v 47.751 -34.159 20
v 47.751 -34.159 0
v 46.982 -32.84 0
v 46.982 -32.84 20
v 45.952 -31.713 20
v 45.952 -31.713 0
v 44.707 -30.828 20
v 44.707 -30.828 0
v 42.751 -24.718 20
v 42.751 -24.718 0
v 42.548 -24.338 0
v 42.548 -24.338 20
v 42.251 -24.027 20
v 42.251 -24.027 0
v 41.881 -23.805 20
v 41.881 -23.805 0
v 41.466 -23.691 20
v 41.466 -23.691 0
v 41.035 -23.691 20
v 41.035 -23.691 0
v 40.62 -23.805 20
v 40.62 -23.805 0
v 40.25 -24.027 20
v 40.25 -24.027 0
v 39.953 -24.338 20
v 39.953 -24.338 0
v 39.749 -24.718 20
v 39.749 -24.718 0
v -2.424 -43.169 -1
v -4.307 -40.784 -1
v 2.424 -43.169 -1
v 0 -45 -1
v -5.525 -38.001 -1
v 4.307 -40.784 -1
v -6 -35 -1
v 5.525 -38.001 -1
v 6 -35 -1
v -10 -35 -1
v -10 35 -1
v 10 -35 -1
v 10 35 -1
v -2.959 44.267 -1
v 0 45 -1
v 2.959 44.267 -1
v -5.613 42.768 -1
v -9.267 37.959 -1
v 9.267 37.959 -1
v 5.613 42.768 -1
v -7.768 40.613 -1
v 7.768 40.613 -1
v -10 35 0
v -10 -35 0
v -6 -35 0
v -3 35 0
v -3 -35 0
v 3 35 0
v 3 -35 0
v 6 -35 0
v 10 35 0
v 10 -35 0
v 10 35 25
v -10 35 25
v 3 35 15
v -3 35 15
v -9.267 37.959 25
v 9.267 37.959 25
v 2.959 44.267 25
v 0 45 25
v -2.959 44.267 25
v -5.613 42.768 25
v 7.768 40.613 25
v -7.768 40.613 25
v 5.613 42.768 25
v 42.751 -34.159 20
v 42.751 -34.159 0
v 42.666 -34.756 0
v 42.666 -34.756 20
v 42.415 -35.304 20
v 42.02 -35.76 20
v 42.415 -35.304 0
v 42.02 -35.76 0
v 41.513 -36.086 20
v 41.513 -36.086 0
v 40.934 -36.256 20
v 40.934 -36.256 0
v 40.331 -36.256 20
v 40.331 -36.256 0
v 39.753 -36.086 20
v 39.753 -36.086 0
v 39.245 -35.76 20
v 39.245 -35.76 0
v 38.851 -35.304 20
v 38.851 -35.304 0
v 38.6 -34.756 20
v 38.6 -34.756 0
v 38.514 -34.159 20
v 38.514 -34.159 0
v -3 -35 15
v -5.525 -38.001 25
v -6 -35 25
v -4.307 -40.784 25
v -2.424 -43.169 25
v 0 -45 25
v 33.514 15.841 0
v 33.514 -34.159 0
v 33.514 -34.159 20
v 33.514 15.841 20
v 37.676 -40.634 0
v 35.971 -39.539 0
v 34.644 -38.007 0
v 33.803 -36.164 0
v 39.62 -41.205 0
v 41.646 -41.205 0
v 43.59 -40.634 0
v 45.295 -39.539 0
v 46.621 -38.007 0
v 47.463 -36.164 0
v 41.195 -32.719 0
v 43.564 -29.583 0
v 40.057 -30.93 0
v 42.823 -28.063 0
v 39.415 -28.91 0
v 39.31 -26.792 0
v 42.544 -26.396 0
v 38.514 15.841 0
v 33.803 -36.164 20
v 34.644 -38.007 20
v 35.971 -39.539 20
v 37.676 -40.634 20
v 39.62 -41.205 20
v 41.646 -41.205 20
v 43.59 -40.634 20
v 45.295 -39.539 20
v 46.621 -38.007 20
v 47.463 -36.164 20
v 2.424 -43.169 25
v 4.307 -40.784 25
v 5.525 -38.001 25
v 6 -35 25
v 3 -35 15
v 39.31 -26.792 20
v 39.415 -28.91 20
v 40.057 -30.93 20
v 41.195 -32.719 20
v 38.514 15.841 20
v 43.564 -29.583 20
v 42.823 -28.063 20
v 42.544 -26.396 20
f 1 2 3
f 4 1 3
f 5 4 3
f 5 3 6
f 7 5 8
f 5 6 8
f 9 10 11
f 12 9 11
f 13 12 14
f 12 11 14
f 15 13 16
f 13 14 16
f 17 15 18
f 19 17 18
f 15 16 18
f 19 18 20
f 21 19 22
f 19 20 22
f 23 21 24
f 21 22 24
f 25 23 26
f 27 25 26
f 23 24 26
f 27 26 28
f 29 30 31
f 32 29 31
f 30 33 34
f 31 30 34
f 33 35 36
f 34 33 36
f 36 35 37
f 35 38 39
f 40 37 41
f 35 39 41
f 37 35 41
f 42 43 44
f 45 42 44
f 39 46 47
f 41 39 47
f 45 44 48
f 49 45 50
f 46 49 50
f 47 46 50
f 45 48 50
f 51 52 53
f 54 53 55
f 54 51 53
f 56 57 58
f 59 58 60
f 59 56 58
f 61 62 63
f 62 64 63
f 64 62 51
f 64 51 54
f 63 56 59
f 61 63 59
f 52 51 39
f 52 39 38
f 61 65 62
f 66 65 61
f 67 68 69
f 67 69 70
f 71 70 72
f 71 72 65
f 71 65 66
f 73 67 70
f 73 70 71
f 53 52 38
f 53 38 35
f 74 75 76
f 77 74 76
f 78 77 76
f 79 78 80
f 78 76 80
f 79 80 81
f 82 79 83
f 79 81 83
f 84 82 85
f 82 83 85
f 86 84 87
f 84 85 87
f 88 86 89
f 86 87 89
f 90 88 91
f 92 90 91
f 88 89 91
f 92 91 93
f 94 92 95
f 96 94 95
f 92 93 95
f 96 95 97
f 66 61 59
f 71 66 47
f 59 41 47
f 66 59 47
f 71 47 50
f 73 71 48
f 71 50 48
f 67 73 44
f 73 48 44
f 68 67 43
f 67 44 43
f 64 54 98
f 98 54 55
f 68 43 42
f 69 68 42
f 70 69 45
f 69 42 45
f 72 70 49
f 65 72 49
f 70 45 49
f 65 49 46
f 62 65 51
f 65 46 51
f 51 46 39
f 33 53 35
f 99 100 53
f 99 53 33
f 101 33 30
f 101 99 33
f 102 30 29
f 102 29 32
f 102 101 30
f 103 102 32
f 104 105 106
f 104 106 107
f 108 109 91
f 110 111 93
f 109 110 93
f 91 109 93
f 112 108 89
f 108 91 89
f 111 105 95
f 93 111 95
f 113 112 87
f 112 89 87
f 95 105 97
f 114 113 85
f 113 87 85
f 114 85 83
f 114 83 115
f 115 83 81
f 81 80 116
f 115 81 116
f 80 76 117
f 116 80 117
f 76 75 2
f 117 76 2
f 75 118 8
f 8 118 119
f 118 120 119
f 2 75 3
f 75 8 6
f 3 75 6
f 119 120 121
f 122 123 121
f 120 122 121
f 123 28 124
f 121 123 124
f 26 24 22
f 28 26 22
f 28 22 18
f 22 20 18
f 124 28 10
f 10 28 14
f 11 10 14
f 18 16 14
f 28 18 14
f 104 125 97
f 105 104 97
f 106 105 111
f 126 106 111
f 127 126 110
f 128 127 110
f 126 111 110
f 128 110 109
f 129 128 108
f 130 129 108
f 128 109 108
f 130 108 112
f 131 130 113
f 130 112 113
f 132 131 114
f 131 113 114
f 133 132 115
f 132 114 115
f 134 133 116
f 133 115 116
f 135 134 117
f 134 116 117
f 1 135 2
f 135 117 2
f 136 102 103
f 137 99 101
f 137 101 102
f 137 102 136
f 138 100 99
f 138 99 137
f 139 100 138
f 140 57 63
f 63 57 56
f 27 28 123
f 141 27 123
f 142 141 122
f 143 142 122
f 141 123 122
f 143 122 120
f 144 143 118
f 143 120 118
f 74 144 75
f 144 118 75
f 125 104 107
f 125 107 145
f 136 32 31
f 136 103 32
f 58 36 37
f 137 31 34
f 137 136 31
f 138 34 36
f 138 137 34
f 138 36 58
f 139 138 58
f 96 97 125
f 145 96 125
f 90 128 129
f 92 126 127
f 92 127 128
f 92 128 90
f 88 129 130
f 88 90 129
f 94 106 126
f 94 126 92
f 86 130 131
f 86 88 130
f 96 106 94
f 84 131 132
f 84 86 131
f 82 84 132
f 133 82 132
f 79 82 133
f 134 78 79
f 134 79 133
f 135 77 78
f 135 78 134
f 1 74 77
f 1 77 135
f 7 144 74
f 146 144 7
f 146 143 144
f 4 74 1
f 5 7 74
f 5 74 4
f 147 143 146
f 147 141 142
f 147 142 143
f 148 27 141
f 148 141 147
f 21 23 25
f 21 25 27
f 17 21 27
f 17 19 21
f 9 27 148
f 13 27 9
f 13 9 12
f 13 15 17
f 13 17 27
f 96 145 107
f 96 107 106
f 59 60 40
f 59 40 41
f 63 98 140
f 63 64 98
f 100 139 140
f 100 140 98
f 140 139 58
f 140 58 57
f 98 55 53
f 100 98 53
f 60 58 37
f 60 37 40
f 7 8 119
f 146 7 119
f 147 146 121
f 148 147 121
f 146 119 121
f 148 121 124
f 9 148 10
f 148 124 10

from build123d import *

# Parameters (mm, degrees)
F0_W     = 3
F0_H     = 29.6977118962
F0_H_2   = 40.3022881038
F1_DEPTH = 1
F2_DEPTH = 15
F3_DEPTH = 25
F4_W     = 5
F4_H     = 50
F5_DEPTH = 20


# Not quite as in the source:
# - ends of sketch curves that miss each other by under 0.0002 mm in the source are joined


with BuildPart() as f1:
    # F0 (on Top) → F1 (new body)
    with BuildSketch(Plane.XY):
        with BuildLine():
            Line((-3, 35), (0, 35))
            Line((0, 35), (0, 45))
            ThreePointArc((0, 45), (-6.7636906533, 41.7636906533), (-10, 35))
            Line((-10, 35), (-3, 35))
        make_face()
        with BuildLine():
            Line((0, 45), (0, 35))
            Line((0, 35), (3, 35))
            Line((3, 35), (10, 35))
            ThreePointArc((10, 35), (6.7636906533, 41.7636906533), (0, 45))
        make_face()
        with Locations((-1.5, 20.1511440519)):
            Rectangle(F0_W, F0_H)
        with Locations((-1.5, -14.8488559481)):
            Rectangle(F0_W, F0_H_2)
        with BuildLine():
            Line((3, -35), (0, -35))
            Line((0, -35), (0, -45))
            ThreePointArc((0, -45), (4.3065233729, -40.7839140238), (6, -35))
            Line((6, -35), (3, -35))
        make_face()
        Polygon((10, 35), (3, 35), (3, -35), (6, -35), (10, -35), align=None)
        Polygon((3, 35), (0, 35), (0, 5.3022881038), (0, -35), (3, -35), align=None)
        Polygon((-3, 5.3022881038), (-3, 35), (-10, 35), (-10, -35), (-6, -35), (-3, -35), align=None)
        with BuildLine():
            Line((0, -45), (0, -35))
            Line((0, -35), (-3, -35))
            Line((-3, -35), (-6, -35))
            ThreePointArc((-6, -35), (-4.3065233729, -40.7839140238), (0, -45))
        make_face()
    extrude(amount=-F1_DEPTH)

    # F0 (on Top) → F2 (join)
    with BuildSketch(Plane.XY):
        with Locations((-1.5, -14.8488559481)):
            Rectangle(F0_W, F0_H_2)
        Polygon((3, 35), (0, 35), (0, 5.3022881038), (0, -35), (3, -35), align=None)
        with Locations((-1.5, 20.1511440519)):
            Rectangle(F0_W, F0_H)
    extrude(amount=F2_DEPTH)

    # F0 (on Top) → F3 (join)
    with BuildSketch(Plane.XY):
        with BuildLine():
            Line((-3, 35), (0, 35))
            Line((0, 35), (0, 45))
            ThreePointArc((0, 45), (-6.7636906533, 41.7636906533), (-10, 35))
            Line((-10, 35), (-3, 35))
        make_face()
        with BuildLine():
            Line((0, 45), (0, 35))
            Line((0, 35), (3, 35))
            Line((3, 35), (10, 35))
            ThreePointArc((10, 35), (6.7636906533, 41.7636906533), (0, 45))
        make_face()
        with BuildLine():
            Line((0, -45), (0, -35))
            Line((0, -35), (-3, -35))
            Line((-3, -35), (-6, -35))
            ThreePointArc((-6, -35), (-4.3065233729, -40.7839140238), (0, -45))
        make_face()
        with BuildLine():
            Line((3, -35), (0, -35))
            Line((0, -35), (0, -45))
            ThreePointArc((0, -45), (4.3065233729, -40.7839140238), (6, -35))
            Line((6, -35), (3, -35))
        make_face()
    extrude(amount=F3_DEPTH)


with BuildPart() as f5:
    # F4 (on Top) → F5 (new body)
    with BuildSketch(Plane.XY):
        with BuildLine():
            Line((38.5142476857, -34.1587369061), (33.5142476857, -34.1587369061))
            ThreePointArc((33.5142476857, -34.1587369061), (40.6328371912, -41.2773264116), (47.7514266968, -34.1587369061))
            ThreePointArc((47.7514266968, -34.1587369061), (46.4966279337, -32.249134599), (44.7070300579, -30.8284163475))
            ThreePointArc((44.7070300579, -30.8284163475), (42.8230618595, -28.0632723139), (42.7514279717, -24.7180927545))
            ThreePointArc((42.7514279717, -24.7180927545), (41.2503035036, -23.6761727856), (39.7491790354, -24.7180927545))
            ThreePointArc((39.7491790354, -24.7180927545), (39.6705937247, -29.9407833051), (42.7514279717, -34.1587369061))
            ThreePointArc((42.7514279717, -34.1587369061), (40.6328371912, -36.2773276865), (38.5142476857, -34.1587369061))
        make_face()
        with Locations((36.0142476857, -9.1587369061)):
            Rectangle(F4_W, F4_H)
    extrude(amount=F5_DEPTH)


solid = Compound([f1.part, f5.part])
